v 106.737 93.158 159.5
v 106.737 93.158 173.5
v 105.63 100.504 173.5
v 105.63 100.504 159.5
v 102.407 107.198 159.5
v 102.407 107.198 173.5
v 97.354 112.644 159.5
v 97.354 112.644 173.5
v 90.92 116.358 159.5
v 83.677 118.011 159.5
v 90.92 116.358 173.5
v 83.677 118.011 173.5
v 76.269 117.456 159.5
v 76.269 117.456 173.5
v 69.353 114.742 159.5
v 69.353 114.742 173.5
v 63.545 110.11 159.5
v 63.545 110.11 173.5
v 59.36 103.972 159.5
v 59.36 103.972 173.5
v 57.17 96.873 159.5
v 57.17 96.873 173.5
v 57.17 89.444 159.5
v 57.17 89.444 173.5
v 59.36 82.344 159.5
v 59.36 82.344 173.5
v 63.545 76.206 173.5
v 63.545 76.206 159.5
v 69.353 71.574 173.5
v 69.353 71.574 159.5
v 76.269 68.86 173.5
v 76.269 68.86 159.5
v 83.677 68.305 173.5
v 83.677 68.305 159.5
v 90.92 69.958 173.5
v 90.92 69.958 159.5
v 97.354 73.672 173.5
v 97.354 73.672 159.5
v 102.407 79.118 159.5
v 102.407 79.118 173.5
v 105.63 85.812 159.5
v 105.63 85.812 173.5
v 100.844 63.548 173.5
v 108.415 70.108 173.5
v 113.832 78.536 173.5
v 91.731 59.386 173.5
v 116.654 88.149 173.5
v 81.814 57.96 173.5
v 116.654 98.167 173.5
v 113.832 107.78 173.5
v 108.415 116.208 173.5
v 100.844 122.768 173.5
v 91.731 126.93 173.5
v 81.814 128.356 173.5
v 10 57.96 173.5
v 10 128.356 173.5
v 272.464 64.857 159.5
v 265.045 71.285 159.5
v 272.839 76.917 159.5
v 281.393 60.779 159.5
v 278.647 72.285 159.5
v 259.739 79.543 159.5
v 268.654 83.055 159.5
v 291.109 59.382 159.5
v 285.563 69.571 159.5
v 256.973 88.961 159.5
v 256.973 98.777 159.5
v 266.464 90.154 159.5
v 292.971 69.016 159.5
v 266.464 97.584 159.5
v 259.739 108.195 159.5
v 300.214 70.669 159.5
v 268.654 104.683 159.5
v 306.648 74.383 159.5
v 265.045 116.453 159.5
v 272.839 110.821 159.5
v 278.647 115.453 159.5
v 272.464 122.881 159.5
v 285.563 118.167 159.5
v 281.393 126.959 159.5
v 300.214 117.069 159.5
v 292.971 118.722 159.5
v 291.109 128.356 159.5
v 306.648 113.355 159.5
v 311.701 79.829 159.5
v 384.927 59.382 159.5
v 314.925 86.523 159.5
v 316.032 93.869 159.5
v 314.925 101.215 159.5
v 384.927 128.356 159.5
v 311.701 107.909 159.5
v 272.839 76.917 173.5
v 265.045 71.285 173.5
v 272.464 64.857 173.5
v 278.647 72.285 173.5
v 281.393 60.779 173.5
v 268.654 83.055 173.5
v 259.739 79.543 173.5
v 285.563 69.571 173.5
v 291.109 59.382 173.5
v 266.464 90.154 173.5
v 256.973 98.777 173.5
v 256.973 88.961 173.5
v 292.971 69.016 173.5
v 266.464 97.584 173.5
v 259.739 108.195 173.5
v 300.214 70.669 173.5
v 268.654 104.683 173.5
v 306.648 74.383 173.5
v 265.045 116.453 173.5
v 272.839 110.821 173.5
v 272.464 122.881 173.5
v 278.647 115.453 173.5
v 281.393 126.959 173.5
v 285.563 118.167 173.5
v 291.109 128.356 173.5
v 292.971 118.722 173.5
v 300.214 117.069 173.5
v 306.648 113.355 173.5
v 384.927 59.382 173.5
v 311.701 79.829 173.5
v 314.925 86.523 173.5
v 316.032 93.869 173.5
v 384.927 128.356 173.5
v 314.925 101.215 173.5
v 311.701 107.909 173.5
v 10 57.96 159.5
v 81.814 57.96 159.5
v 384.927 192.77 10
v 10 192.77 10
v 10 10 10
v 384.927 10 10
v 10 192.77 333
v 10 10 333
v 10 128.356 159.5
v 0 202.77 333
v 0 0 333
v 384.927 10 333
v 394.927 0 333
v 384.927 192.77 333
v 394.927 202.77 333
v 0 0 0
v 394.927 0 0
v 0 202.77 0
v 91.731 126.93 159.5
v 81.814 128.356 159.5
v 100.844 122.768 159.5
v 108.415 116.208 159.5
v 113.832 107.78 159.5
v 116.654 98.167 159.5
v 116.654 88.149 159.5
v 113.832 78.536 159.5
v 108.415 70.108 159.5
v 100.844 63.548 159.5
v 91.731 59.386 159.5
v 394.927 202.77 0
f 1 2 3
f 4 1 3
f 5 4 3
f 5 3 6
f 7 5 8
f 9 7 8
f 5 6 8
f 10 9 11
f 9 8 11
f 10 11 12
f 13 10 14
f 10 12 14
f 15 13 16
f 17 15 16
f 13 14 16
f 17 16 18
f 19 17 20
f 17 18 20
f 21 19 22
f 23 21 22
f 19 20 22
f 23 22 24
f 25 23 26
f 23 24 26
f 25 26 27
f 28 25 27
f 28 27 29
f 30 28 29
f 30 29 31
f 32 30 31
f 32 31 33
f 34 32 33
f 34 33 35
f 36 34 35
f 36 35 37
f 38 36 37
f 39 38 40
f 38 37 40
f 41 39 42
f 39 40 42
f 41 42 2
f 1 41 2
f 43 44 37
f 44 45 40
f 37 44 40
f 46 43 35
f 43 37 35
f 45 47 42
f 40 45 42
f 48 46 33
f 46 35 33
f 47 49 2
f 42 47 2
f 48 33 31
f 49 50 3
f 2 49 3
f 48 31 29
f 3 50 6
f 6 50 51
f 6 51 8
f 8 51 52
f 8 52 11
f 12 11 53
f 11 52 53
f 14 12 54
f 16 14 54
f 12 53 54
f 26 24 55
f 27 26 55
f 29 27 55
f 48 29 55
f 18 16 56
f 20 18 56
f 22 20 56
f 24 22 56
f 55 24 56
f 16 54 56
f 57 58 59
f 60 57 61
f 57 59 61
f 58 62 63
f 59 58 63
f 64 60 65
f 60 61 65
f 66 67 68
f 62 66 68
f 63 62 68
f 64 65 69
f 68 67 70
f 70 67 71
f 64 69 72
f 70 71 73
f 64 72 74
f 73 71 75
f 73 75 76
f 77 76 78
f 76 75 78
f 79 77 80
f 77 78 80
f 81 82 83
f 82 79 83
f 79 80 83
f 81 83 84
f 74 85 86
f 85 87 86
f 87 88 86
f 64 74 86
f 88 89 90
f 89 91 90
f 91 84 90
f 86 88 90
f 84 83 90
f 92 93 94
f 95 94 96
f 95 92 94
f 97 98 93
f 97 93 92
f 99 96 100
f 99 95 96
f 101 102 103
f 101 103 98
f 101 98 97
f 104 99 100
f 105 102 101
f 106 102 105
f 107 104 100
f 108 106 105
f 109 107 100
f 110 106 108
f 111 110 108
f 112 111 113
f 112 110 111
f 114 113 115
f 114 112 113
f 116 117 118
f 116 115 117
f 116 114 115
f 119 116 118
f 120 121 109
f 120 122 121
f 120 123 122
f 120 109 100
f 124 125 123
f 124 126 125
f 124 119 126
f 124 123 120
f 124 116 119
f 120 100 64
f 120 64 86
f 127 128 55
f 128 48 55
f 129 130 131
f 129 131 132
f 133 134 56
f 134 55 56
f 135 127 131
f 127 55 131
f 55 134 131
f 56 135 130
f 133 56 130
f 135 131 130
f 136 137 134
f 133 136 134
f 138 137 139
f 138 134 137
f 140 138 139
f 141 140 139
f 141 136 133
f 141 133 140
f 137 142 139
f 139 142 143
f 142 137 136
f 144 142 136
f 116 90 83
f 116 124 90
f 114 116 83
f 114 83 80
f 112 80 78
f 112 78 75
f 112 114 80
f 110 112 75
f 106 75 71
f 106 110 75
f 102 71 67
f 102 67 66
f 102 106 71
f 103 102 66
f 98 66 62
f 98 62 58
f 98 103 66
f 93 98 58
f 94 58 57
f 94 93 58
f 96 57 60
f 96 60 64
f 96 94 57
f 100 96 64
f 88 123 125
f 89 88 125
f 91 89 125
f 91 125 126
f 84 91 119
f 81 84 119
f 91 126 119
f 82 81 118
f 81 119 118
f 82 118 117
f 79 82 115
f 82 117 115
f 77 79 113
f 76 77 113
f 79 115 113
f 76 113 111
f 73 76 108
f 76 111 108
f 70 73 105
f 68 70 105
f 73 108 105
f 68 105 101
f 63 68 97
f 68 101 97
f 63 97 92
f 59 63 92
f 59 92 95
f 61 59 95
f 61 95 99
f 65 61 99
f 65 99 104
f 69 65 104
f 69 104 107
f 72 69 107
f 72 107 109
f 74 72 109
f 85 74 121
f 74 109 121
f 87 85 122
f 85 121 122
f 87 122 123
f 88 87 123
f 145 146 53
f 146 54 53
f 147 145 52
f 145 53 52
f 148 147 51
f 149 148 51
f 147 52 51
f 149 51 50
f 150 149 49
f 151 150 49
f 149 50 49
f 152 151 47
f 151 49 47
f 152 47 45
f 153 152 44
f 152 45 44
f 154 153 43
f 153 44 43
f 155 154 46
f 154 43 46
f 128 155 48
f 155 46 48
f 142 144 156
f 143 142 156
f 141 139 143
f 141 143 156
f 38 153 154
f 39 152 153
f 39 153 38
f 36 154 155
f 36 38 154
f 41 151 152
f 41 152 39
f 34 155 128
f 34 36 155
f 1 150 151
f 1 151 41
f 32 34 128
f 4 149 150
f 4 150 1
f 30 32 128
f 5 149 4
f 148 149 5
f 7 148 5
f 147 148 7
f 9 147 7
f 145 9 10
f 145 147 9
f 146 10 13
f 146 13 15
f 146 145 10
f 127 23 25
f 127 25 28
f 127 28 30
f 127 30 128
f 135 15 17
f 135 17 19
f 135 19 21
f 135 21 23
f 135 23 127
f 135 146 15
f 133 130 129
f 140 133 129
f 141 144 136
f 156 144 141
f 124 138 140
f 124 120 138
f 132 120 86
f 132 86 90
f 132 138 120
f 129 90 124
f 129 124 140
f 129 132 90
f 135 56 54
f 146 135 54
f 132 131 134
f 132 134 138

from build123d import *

# Parameters (mm, degrees)
SKETCH1_W           = 394.926652775
SKETCH1_H           = 202.769674437
BOSS_EXTRUDE1_DEPTH = 333
SHELL5_T            = -10
BOSS_EXTRUDE2_DEPTH = 7
SKETCH19_R          = 24.92303726
CUT_EXTRUDE1_DEPTH  = 14
BOSS_EXTRUDE3_DEPTH = 7
SKETCH23_R          = 24.92303726
CUT_EXTRUDE2_DEPTH  = 14


with BuildPart() as part:
    # Sketch1 → Boss-Extrude1 (new body)
    with BuildSketch(Plane.XY):
        with Locations((197.463326388, 101.384837219)):
            Rectangle(SKETCH1_W, SKETCH1_H)
    extrude(amount=BOSS_EXTRUDE1_DEPTH)

    # Shell5
    shell5_openings = [part.faces().sort_by_distance(p)[0] for p in [
        (197.463326387, 101.384837219, 333),
    ]]
    offset(amount=SHELL5_T, openings=shell5_openings, kind=Kind.INTERSECTION)

    # Sketch18 → Boss-Extrude2 (add, symmetric)
    with BuildSketch(Plane.XY.offset(166.5)):
        with BuildLine():
            Line((10, 128.355944405), (81.814439739, 128.355944405))
            ThreePointArc((81.814439739, 128.355944405), (117.012291579, 93.158092565), (81.814439739, 57.960240724))
            Line((81.814439739, 57.960240724), (10, 57.960240724))
            Line((10, 57.960240724), (10, 128.355944405))
        make_face()
    extrude(amount=BOSS_EXTRUDE2_DEPTH, both=True)

    # Sketch19 → Cut-Extrude1 (cut)
    with BuildSketch(Plane.XY.offset(173.5)):
        with Locations((81.814439739, 93.158092565)):
            Circle(SKETCH19_R)
    extrude(amount=-CUT_EXTRUDE1_DEPTH, mode=Mode.SUBTRACT)

    # Sketch22 → Boss-Extrude3 (add, symmetric)
    with BuildSketch(Plane.XY.offset(166.5)):
        with BuildLine():
            Line((384.926652775, 128.355944405), (291.108955259, 128.355944405))
            ThreePointArc((291.108955259, 128.355944405), (256.621992249, 93.868981396), (291.108955259, 59.382018386))
            Line((291.108955259, 59.382018386), (384.926652775, 59.382018386))
            Line((384.926652775, 59.382018386), (384.926652775, 128.355944405))
        make_face()
    extrude(amount=BOSS_EXTRUDE3_DEPTH, both=True)

    # Sketch23 → Cut-Extrude2 (cut)
    with BuildSketch(Plane.XY.offset(173.5)):
        with Locations((291.108955259, 93.868981396)):
            Circle(SKETCH23_R)
    extrude(amount=-CUT_EXTRUDE2_DEPTH, mode=Mode.SUBTRACT)


solid = part.part
